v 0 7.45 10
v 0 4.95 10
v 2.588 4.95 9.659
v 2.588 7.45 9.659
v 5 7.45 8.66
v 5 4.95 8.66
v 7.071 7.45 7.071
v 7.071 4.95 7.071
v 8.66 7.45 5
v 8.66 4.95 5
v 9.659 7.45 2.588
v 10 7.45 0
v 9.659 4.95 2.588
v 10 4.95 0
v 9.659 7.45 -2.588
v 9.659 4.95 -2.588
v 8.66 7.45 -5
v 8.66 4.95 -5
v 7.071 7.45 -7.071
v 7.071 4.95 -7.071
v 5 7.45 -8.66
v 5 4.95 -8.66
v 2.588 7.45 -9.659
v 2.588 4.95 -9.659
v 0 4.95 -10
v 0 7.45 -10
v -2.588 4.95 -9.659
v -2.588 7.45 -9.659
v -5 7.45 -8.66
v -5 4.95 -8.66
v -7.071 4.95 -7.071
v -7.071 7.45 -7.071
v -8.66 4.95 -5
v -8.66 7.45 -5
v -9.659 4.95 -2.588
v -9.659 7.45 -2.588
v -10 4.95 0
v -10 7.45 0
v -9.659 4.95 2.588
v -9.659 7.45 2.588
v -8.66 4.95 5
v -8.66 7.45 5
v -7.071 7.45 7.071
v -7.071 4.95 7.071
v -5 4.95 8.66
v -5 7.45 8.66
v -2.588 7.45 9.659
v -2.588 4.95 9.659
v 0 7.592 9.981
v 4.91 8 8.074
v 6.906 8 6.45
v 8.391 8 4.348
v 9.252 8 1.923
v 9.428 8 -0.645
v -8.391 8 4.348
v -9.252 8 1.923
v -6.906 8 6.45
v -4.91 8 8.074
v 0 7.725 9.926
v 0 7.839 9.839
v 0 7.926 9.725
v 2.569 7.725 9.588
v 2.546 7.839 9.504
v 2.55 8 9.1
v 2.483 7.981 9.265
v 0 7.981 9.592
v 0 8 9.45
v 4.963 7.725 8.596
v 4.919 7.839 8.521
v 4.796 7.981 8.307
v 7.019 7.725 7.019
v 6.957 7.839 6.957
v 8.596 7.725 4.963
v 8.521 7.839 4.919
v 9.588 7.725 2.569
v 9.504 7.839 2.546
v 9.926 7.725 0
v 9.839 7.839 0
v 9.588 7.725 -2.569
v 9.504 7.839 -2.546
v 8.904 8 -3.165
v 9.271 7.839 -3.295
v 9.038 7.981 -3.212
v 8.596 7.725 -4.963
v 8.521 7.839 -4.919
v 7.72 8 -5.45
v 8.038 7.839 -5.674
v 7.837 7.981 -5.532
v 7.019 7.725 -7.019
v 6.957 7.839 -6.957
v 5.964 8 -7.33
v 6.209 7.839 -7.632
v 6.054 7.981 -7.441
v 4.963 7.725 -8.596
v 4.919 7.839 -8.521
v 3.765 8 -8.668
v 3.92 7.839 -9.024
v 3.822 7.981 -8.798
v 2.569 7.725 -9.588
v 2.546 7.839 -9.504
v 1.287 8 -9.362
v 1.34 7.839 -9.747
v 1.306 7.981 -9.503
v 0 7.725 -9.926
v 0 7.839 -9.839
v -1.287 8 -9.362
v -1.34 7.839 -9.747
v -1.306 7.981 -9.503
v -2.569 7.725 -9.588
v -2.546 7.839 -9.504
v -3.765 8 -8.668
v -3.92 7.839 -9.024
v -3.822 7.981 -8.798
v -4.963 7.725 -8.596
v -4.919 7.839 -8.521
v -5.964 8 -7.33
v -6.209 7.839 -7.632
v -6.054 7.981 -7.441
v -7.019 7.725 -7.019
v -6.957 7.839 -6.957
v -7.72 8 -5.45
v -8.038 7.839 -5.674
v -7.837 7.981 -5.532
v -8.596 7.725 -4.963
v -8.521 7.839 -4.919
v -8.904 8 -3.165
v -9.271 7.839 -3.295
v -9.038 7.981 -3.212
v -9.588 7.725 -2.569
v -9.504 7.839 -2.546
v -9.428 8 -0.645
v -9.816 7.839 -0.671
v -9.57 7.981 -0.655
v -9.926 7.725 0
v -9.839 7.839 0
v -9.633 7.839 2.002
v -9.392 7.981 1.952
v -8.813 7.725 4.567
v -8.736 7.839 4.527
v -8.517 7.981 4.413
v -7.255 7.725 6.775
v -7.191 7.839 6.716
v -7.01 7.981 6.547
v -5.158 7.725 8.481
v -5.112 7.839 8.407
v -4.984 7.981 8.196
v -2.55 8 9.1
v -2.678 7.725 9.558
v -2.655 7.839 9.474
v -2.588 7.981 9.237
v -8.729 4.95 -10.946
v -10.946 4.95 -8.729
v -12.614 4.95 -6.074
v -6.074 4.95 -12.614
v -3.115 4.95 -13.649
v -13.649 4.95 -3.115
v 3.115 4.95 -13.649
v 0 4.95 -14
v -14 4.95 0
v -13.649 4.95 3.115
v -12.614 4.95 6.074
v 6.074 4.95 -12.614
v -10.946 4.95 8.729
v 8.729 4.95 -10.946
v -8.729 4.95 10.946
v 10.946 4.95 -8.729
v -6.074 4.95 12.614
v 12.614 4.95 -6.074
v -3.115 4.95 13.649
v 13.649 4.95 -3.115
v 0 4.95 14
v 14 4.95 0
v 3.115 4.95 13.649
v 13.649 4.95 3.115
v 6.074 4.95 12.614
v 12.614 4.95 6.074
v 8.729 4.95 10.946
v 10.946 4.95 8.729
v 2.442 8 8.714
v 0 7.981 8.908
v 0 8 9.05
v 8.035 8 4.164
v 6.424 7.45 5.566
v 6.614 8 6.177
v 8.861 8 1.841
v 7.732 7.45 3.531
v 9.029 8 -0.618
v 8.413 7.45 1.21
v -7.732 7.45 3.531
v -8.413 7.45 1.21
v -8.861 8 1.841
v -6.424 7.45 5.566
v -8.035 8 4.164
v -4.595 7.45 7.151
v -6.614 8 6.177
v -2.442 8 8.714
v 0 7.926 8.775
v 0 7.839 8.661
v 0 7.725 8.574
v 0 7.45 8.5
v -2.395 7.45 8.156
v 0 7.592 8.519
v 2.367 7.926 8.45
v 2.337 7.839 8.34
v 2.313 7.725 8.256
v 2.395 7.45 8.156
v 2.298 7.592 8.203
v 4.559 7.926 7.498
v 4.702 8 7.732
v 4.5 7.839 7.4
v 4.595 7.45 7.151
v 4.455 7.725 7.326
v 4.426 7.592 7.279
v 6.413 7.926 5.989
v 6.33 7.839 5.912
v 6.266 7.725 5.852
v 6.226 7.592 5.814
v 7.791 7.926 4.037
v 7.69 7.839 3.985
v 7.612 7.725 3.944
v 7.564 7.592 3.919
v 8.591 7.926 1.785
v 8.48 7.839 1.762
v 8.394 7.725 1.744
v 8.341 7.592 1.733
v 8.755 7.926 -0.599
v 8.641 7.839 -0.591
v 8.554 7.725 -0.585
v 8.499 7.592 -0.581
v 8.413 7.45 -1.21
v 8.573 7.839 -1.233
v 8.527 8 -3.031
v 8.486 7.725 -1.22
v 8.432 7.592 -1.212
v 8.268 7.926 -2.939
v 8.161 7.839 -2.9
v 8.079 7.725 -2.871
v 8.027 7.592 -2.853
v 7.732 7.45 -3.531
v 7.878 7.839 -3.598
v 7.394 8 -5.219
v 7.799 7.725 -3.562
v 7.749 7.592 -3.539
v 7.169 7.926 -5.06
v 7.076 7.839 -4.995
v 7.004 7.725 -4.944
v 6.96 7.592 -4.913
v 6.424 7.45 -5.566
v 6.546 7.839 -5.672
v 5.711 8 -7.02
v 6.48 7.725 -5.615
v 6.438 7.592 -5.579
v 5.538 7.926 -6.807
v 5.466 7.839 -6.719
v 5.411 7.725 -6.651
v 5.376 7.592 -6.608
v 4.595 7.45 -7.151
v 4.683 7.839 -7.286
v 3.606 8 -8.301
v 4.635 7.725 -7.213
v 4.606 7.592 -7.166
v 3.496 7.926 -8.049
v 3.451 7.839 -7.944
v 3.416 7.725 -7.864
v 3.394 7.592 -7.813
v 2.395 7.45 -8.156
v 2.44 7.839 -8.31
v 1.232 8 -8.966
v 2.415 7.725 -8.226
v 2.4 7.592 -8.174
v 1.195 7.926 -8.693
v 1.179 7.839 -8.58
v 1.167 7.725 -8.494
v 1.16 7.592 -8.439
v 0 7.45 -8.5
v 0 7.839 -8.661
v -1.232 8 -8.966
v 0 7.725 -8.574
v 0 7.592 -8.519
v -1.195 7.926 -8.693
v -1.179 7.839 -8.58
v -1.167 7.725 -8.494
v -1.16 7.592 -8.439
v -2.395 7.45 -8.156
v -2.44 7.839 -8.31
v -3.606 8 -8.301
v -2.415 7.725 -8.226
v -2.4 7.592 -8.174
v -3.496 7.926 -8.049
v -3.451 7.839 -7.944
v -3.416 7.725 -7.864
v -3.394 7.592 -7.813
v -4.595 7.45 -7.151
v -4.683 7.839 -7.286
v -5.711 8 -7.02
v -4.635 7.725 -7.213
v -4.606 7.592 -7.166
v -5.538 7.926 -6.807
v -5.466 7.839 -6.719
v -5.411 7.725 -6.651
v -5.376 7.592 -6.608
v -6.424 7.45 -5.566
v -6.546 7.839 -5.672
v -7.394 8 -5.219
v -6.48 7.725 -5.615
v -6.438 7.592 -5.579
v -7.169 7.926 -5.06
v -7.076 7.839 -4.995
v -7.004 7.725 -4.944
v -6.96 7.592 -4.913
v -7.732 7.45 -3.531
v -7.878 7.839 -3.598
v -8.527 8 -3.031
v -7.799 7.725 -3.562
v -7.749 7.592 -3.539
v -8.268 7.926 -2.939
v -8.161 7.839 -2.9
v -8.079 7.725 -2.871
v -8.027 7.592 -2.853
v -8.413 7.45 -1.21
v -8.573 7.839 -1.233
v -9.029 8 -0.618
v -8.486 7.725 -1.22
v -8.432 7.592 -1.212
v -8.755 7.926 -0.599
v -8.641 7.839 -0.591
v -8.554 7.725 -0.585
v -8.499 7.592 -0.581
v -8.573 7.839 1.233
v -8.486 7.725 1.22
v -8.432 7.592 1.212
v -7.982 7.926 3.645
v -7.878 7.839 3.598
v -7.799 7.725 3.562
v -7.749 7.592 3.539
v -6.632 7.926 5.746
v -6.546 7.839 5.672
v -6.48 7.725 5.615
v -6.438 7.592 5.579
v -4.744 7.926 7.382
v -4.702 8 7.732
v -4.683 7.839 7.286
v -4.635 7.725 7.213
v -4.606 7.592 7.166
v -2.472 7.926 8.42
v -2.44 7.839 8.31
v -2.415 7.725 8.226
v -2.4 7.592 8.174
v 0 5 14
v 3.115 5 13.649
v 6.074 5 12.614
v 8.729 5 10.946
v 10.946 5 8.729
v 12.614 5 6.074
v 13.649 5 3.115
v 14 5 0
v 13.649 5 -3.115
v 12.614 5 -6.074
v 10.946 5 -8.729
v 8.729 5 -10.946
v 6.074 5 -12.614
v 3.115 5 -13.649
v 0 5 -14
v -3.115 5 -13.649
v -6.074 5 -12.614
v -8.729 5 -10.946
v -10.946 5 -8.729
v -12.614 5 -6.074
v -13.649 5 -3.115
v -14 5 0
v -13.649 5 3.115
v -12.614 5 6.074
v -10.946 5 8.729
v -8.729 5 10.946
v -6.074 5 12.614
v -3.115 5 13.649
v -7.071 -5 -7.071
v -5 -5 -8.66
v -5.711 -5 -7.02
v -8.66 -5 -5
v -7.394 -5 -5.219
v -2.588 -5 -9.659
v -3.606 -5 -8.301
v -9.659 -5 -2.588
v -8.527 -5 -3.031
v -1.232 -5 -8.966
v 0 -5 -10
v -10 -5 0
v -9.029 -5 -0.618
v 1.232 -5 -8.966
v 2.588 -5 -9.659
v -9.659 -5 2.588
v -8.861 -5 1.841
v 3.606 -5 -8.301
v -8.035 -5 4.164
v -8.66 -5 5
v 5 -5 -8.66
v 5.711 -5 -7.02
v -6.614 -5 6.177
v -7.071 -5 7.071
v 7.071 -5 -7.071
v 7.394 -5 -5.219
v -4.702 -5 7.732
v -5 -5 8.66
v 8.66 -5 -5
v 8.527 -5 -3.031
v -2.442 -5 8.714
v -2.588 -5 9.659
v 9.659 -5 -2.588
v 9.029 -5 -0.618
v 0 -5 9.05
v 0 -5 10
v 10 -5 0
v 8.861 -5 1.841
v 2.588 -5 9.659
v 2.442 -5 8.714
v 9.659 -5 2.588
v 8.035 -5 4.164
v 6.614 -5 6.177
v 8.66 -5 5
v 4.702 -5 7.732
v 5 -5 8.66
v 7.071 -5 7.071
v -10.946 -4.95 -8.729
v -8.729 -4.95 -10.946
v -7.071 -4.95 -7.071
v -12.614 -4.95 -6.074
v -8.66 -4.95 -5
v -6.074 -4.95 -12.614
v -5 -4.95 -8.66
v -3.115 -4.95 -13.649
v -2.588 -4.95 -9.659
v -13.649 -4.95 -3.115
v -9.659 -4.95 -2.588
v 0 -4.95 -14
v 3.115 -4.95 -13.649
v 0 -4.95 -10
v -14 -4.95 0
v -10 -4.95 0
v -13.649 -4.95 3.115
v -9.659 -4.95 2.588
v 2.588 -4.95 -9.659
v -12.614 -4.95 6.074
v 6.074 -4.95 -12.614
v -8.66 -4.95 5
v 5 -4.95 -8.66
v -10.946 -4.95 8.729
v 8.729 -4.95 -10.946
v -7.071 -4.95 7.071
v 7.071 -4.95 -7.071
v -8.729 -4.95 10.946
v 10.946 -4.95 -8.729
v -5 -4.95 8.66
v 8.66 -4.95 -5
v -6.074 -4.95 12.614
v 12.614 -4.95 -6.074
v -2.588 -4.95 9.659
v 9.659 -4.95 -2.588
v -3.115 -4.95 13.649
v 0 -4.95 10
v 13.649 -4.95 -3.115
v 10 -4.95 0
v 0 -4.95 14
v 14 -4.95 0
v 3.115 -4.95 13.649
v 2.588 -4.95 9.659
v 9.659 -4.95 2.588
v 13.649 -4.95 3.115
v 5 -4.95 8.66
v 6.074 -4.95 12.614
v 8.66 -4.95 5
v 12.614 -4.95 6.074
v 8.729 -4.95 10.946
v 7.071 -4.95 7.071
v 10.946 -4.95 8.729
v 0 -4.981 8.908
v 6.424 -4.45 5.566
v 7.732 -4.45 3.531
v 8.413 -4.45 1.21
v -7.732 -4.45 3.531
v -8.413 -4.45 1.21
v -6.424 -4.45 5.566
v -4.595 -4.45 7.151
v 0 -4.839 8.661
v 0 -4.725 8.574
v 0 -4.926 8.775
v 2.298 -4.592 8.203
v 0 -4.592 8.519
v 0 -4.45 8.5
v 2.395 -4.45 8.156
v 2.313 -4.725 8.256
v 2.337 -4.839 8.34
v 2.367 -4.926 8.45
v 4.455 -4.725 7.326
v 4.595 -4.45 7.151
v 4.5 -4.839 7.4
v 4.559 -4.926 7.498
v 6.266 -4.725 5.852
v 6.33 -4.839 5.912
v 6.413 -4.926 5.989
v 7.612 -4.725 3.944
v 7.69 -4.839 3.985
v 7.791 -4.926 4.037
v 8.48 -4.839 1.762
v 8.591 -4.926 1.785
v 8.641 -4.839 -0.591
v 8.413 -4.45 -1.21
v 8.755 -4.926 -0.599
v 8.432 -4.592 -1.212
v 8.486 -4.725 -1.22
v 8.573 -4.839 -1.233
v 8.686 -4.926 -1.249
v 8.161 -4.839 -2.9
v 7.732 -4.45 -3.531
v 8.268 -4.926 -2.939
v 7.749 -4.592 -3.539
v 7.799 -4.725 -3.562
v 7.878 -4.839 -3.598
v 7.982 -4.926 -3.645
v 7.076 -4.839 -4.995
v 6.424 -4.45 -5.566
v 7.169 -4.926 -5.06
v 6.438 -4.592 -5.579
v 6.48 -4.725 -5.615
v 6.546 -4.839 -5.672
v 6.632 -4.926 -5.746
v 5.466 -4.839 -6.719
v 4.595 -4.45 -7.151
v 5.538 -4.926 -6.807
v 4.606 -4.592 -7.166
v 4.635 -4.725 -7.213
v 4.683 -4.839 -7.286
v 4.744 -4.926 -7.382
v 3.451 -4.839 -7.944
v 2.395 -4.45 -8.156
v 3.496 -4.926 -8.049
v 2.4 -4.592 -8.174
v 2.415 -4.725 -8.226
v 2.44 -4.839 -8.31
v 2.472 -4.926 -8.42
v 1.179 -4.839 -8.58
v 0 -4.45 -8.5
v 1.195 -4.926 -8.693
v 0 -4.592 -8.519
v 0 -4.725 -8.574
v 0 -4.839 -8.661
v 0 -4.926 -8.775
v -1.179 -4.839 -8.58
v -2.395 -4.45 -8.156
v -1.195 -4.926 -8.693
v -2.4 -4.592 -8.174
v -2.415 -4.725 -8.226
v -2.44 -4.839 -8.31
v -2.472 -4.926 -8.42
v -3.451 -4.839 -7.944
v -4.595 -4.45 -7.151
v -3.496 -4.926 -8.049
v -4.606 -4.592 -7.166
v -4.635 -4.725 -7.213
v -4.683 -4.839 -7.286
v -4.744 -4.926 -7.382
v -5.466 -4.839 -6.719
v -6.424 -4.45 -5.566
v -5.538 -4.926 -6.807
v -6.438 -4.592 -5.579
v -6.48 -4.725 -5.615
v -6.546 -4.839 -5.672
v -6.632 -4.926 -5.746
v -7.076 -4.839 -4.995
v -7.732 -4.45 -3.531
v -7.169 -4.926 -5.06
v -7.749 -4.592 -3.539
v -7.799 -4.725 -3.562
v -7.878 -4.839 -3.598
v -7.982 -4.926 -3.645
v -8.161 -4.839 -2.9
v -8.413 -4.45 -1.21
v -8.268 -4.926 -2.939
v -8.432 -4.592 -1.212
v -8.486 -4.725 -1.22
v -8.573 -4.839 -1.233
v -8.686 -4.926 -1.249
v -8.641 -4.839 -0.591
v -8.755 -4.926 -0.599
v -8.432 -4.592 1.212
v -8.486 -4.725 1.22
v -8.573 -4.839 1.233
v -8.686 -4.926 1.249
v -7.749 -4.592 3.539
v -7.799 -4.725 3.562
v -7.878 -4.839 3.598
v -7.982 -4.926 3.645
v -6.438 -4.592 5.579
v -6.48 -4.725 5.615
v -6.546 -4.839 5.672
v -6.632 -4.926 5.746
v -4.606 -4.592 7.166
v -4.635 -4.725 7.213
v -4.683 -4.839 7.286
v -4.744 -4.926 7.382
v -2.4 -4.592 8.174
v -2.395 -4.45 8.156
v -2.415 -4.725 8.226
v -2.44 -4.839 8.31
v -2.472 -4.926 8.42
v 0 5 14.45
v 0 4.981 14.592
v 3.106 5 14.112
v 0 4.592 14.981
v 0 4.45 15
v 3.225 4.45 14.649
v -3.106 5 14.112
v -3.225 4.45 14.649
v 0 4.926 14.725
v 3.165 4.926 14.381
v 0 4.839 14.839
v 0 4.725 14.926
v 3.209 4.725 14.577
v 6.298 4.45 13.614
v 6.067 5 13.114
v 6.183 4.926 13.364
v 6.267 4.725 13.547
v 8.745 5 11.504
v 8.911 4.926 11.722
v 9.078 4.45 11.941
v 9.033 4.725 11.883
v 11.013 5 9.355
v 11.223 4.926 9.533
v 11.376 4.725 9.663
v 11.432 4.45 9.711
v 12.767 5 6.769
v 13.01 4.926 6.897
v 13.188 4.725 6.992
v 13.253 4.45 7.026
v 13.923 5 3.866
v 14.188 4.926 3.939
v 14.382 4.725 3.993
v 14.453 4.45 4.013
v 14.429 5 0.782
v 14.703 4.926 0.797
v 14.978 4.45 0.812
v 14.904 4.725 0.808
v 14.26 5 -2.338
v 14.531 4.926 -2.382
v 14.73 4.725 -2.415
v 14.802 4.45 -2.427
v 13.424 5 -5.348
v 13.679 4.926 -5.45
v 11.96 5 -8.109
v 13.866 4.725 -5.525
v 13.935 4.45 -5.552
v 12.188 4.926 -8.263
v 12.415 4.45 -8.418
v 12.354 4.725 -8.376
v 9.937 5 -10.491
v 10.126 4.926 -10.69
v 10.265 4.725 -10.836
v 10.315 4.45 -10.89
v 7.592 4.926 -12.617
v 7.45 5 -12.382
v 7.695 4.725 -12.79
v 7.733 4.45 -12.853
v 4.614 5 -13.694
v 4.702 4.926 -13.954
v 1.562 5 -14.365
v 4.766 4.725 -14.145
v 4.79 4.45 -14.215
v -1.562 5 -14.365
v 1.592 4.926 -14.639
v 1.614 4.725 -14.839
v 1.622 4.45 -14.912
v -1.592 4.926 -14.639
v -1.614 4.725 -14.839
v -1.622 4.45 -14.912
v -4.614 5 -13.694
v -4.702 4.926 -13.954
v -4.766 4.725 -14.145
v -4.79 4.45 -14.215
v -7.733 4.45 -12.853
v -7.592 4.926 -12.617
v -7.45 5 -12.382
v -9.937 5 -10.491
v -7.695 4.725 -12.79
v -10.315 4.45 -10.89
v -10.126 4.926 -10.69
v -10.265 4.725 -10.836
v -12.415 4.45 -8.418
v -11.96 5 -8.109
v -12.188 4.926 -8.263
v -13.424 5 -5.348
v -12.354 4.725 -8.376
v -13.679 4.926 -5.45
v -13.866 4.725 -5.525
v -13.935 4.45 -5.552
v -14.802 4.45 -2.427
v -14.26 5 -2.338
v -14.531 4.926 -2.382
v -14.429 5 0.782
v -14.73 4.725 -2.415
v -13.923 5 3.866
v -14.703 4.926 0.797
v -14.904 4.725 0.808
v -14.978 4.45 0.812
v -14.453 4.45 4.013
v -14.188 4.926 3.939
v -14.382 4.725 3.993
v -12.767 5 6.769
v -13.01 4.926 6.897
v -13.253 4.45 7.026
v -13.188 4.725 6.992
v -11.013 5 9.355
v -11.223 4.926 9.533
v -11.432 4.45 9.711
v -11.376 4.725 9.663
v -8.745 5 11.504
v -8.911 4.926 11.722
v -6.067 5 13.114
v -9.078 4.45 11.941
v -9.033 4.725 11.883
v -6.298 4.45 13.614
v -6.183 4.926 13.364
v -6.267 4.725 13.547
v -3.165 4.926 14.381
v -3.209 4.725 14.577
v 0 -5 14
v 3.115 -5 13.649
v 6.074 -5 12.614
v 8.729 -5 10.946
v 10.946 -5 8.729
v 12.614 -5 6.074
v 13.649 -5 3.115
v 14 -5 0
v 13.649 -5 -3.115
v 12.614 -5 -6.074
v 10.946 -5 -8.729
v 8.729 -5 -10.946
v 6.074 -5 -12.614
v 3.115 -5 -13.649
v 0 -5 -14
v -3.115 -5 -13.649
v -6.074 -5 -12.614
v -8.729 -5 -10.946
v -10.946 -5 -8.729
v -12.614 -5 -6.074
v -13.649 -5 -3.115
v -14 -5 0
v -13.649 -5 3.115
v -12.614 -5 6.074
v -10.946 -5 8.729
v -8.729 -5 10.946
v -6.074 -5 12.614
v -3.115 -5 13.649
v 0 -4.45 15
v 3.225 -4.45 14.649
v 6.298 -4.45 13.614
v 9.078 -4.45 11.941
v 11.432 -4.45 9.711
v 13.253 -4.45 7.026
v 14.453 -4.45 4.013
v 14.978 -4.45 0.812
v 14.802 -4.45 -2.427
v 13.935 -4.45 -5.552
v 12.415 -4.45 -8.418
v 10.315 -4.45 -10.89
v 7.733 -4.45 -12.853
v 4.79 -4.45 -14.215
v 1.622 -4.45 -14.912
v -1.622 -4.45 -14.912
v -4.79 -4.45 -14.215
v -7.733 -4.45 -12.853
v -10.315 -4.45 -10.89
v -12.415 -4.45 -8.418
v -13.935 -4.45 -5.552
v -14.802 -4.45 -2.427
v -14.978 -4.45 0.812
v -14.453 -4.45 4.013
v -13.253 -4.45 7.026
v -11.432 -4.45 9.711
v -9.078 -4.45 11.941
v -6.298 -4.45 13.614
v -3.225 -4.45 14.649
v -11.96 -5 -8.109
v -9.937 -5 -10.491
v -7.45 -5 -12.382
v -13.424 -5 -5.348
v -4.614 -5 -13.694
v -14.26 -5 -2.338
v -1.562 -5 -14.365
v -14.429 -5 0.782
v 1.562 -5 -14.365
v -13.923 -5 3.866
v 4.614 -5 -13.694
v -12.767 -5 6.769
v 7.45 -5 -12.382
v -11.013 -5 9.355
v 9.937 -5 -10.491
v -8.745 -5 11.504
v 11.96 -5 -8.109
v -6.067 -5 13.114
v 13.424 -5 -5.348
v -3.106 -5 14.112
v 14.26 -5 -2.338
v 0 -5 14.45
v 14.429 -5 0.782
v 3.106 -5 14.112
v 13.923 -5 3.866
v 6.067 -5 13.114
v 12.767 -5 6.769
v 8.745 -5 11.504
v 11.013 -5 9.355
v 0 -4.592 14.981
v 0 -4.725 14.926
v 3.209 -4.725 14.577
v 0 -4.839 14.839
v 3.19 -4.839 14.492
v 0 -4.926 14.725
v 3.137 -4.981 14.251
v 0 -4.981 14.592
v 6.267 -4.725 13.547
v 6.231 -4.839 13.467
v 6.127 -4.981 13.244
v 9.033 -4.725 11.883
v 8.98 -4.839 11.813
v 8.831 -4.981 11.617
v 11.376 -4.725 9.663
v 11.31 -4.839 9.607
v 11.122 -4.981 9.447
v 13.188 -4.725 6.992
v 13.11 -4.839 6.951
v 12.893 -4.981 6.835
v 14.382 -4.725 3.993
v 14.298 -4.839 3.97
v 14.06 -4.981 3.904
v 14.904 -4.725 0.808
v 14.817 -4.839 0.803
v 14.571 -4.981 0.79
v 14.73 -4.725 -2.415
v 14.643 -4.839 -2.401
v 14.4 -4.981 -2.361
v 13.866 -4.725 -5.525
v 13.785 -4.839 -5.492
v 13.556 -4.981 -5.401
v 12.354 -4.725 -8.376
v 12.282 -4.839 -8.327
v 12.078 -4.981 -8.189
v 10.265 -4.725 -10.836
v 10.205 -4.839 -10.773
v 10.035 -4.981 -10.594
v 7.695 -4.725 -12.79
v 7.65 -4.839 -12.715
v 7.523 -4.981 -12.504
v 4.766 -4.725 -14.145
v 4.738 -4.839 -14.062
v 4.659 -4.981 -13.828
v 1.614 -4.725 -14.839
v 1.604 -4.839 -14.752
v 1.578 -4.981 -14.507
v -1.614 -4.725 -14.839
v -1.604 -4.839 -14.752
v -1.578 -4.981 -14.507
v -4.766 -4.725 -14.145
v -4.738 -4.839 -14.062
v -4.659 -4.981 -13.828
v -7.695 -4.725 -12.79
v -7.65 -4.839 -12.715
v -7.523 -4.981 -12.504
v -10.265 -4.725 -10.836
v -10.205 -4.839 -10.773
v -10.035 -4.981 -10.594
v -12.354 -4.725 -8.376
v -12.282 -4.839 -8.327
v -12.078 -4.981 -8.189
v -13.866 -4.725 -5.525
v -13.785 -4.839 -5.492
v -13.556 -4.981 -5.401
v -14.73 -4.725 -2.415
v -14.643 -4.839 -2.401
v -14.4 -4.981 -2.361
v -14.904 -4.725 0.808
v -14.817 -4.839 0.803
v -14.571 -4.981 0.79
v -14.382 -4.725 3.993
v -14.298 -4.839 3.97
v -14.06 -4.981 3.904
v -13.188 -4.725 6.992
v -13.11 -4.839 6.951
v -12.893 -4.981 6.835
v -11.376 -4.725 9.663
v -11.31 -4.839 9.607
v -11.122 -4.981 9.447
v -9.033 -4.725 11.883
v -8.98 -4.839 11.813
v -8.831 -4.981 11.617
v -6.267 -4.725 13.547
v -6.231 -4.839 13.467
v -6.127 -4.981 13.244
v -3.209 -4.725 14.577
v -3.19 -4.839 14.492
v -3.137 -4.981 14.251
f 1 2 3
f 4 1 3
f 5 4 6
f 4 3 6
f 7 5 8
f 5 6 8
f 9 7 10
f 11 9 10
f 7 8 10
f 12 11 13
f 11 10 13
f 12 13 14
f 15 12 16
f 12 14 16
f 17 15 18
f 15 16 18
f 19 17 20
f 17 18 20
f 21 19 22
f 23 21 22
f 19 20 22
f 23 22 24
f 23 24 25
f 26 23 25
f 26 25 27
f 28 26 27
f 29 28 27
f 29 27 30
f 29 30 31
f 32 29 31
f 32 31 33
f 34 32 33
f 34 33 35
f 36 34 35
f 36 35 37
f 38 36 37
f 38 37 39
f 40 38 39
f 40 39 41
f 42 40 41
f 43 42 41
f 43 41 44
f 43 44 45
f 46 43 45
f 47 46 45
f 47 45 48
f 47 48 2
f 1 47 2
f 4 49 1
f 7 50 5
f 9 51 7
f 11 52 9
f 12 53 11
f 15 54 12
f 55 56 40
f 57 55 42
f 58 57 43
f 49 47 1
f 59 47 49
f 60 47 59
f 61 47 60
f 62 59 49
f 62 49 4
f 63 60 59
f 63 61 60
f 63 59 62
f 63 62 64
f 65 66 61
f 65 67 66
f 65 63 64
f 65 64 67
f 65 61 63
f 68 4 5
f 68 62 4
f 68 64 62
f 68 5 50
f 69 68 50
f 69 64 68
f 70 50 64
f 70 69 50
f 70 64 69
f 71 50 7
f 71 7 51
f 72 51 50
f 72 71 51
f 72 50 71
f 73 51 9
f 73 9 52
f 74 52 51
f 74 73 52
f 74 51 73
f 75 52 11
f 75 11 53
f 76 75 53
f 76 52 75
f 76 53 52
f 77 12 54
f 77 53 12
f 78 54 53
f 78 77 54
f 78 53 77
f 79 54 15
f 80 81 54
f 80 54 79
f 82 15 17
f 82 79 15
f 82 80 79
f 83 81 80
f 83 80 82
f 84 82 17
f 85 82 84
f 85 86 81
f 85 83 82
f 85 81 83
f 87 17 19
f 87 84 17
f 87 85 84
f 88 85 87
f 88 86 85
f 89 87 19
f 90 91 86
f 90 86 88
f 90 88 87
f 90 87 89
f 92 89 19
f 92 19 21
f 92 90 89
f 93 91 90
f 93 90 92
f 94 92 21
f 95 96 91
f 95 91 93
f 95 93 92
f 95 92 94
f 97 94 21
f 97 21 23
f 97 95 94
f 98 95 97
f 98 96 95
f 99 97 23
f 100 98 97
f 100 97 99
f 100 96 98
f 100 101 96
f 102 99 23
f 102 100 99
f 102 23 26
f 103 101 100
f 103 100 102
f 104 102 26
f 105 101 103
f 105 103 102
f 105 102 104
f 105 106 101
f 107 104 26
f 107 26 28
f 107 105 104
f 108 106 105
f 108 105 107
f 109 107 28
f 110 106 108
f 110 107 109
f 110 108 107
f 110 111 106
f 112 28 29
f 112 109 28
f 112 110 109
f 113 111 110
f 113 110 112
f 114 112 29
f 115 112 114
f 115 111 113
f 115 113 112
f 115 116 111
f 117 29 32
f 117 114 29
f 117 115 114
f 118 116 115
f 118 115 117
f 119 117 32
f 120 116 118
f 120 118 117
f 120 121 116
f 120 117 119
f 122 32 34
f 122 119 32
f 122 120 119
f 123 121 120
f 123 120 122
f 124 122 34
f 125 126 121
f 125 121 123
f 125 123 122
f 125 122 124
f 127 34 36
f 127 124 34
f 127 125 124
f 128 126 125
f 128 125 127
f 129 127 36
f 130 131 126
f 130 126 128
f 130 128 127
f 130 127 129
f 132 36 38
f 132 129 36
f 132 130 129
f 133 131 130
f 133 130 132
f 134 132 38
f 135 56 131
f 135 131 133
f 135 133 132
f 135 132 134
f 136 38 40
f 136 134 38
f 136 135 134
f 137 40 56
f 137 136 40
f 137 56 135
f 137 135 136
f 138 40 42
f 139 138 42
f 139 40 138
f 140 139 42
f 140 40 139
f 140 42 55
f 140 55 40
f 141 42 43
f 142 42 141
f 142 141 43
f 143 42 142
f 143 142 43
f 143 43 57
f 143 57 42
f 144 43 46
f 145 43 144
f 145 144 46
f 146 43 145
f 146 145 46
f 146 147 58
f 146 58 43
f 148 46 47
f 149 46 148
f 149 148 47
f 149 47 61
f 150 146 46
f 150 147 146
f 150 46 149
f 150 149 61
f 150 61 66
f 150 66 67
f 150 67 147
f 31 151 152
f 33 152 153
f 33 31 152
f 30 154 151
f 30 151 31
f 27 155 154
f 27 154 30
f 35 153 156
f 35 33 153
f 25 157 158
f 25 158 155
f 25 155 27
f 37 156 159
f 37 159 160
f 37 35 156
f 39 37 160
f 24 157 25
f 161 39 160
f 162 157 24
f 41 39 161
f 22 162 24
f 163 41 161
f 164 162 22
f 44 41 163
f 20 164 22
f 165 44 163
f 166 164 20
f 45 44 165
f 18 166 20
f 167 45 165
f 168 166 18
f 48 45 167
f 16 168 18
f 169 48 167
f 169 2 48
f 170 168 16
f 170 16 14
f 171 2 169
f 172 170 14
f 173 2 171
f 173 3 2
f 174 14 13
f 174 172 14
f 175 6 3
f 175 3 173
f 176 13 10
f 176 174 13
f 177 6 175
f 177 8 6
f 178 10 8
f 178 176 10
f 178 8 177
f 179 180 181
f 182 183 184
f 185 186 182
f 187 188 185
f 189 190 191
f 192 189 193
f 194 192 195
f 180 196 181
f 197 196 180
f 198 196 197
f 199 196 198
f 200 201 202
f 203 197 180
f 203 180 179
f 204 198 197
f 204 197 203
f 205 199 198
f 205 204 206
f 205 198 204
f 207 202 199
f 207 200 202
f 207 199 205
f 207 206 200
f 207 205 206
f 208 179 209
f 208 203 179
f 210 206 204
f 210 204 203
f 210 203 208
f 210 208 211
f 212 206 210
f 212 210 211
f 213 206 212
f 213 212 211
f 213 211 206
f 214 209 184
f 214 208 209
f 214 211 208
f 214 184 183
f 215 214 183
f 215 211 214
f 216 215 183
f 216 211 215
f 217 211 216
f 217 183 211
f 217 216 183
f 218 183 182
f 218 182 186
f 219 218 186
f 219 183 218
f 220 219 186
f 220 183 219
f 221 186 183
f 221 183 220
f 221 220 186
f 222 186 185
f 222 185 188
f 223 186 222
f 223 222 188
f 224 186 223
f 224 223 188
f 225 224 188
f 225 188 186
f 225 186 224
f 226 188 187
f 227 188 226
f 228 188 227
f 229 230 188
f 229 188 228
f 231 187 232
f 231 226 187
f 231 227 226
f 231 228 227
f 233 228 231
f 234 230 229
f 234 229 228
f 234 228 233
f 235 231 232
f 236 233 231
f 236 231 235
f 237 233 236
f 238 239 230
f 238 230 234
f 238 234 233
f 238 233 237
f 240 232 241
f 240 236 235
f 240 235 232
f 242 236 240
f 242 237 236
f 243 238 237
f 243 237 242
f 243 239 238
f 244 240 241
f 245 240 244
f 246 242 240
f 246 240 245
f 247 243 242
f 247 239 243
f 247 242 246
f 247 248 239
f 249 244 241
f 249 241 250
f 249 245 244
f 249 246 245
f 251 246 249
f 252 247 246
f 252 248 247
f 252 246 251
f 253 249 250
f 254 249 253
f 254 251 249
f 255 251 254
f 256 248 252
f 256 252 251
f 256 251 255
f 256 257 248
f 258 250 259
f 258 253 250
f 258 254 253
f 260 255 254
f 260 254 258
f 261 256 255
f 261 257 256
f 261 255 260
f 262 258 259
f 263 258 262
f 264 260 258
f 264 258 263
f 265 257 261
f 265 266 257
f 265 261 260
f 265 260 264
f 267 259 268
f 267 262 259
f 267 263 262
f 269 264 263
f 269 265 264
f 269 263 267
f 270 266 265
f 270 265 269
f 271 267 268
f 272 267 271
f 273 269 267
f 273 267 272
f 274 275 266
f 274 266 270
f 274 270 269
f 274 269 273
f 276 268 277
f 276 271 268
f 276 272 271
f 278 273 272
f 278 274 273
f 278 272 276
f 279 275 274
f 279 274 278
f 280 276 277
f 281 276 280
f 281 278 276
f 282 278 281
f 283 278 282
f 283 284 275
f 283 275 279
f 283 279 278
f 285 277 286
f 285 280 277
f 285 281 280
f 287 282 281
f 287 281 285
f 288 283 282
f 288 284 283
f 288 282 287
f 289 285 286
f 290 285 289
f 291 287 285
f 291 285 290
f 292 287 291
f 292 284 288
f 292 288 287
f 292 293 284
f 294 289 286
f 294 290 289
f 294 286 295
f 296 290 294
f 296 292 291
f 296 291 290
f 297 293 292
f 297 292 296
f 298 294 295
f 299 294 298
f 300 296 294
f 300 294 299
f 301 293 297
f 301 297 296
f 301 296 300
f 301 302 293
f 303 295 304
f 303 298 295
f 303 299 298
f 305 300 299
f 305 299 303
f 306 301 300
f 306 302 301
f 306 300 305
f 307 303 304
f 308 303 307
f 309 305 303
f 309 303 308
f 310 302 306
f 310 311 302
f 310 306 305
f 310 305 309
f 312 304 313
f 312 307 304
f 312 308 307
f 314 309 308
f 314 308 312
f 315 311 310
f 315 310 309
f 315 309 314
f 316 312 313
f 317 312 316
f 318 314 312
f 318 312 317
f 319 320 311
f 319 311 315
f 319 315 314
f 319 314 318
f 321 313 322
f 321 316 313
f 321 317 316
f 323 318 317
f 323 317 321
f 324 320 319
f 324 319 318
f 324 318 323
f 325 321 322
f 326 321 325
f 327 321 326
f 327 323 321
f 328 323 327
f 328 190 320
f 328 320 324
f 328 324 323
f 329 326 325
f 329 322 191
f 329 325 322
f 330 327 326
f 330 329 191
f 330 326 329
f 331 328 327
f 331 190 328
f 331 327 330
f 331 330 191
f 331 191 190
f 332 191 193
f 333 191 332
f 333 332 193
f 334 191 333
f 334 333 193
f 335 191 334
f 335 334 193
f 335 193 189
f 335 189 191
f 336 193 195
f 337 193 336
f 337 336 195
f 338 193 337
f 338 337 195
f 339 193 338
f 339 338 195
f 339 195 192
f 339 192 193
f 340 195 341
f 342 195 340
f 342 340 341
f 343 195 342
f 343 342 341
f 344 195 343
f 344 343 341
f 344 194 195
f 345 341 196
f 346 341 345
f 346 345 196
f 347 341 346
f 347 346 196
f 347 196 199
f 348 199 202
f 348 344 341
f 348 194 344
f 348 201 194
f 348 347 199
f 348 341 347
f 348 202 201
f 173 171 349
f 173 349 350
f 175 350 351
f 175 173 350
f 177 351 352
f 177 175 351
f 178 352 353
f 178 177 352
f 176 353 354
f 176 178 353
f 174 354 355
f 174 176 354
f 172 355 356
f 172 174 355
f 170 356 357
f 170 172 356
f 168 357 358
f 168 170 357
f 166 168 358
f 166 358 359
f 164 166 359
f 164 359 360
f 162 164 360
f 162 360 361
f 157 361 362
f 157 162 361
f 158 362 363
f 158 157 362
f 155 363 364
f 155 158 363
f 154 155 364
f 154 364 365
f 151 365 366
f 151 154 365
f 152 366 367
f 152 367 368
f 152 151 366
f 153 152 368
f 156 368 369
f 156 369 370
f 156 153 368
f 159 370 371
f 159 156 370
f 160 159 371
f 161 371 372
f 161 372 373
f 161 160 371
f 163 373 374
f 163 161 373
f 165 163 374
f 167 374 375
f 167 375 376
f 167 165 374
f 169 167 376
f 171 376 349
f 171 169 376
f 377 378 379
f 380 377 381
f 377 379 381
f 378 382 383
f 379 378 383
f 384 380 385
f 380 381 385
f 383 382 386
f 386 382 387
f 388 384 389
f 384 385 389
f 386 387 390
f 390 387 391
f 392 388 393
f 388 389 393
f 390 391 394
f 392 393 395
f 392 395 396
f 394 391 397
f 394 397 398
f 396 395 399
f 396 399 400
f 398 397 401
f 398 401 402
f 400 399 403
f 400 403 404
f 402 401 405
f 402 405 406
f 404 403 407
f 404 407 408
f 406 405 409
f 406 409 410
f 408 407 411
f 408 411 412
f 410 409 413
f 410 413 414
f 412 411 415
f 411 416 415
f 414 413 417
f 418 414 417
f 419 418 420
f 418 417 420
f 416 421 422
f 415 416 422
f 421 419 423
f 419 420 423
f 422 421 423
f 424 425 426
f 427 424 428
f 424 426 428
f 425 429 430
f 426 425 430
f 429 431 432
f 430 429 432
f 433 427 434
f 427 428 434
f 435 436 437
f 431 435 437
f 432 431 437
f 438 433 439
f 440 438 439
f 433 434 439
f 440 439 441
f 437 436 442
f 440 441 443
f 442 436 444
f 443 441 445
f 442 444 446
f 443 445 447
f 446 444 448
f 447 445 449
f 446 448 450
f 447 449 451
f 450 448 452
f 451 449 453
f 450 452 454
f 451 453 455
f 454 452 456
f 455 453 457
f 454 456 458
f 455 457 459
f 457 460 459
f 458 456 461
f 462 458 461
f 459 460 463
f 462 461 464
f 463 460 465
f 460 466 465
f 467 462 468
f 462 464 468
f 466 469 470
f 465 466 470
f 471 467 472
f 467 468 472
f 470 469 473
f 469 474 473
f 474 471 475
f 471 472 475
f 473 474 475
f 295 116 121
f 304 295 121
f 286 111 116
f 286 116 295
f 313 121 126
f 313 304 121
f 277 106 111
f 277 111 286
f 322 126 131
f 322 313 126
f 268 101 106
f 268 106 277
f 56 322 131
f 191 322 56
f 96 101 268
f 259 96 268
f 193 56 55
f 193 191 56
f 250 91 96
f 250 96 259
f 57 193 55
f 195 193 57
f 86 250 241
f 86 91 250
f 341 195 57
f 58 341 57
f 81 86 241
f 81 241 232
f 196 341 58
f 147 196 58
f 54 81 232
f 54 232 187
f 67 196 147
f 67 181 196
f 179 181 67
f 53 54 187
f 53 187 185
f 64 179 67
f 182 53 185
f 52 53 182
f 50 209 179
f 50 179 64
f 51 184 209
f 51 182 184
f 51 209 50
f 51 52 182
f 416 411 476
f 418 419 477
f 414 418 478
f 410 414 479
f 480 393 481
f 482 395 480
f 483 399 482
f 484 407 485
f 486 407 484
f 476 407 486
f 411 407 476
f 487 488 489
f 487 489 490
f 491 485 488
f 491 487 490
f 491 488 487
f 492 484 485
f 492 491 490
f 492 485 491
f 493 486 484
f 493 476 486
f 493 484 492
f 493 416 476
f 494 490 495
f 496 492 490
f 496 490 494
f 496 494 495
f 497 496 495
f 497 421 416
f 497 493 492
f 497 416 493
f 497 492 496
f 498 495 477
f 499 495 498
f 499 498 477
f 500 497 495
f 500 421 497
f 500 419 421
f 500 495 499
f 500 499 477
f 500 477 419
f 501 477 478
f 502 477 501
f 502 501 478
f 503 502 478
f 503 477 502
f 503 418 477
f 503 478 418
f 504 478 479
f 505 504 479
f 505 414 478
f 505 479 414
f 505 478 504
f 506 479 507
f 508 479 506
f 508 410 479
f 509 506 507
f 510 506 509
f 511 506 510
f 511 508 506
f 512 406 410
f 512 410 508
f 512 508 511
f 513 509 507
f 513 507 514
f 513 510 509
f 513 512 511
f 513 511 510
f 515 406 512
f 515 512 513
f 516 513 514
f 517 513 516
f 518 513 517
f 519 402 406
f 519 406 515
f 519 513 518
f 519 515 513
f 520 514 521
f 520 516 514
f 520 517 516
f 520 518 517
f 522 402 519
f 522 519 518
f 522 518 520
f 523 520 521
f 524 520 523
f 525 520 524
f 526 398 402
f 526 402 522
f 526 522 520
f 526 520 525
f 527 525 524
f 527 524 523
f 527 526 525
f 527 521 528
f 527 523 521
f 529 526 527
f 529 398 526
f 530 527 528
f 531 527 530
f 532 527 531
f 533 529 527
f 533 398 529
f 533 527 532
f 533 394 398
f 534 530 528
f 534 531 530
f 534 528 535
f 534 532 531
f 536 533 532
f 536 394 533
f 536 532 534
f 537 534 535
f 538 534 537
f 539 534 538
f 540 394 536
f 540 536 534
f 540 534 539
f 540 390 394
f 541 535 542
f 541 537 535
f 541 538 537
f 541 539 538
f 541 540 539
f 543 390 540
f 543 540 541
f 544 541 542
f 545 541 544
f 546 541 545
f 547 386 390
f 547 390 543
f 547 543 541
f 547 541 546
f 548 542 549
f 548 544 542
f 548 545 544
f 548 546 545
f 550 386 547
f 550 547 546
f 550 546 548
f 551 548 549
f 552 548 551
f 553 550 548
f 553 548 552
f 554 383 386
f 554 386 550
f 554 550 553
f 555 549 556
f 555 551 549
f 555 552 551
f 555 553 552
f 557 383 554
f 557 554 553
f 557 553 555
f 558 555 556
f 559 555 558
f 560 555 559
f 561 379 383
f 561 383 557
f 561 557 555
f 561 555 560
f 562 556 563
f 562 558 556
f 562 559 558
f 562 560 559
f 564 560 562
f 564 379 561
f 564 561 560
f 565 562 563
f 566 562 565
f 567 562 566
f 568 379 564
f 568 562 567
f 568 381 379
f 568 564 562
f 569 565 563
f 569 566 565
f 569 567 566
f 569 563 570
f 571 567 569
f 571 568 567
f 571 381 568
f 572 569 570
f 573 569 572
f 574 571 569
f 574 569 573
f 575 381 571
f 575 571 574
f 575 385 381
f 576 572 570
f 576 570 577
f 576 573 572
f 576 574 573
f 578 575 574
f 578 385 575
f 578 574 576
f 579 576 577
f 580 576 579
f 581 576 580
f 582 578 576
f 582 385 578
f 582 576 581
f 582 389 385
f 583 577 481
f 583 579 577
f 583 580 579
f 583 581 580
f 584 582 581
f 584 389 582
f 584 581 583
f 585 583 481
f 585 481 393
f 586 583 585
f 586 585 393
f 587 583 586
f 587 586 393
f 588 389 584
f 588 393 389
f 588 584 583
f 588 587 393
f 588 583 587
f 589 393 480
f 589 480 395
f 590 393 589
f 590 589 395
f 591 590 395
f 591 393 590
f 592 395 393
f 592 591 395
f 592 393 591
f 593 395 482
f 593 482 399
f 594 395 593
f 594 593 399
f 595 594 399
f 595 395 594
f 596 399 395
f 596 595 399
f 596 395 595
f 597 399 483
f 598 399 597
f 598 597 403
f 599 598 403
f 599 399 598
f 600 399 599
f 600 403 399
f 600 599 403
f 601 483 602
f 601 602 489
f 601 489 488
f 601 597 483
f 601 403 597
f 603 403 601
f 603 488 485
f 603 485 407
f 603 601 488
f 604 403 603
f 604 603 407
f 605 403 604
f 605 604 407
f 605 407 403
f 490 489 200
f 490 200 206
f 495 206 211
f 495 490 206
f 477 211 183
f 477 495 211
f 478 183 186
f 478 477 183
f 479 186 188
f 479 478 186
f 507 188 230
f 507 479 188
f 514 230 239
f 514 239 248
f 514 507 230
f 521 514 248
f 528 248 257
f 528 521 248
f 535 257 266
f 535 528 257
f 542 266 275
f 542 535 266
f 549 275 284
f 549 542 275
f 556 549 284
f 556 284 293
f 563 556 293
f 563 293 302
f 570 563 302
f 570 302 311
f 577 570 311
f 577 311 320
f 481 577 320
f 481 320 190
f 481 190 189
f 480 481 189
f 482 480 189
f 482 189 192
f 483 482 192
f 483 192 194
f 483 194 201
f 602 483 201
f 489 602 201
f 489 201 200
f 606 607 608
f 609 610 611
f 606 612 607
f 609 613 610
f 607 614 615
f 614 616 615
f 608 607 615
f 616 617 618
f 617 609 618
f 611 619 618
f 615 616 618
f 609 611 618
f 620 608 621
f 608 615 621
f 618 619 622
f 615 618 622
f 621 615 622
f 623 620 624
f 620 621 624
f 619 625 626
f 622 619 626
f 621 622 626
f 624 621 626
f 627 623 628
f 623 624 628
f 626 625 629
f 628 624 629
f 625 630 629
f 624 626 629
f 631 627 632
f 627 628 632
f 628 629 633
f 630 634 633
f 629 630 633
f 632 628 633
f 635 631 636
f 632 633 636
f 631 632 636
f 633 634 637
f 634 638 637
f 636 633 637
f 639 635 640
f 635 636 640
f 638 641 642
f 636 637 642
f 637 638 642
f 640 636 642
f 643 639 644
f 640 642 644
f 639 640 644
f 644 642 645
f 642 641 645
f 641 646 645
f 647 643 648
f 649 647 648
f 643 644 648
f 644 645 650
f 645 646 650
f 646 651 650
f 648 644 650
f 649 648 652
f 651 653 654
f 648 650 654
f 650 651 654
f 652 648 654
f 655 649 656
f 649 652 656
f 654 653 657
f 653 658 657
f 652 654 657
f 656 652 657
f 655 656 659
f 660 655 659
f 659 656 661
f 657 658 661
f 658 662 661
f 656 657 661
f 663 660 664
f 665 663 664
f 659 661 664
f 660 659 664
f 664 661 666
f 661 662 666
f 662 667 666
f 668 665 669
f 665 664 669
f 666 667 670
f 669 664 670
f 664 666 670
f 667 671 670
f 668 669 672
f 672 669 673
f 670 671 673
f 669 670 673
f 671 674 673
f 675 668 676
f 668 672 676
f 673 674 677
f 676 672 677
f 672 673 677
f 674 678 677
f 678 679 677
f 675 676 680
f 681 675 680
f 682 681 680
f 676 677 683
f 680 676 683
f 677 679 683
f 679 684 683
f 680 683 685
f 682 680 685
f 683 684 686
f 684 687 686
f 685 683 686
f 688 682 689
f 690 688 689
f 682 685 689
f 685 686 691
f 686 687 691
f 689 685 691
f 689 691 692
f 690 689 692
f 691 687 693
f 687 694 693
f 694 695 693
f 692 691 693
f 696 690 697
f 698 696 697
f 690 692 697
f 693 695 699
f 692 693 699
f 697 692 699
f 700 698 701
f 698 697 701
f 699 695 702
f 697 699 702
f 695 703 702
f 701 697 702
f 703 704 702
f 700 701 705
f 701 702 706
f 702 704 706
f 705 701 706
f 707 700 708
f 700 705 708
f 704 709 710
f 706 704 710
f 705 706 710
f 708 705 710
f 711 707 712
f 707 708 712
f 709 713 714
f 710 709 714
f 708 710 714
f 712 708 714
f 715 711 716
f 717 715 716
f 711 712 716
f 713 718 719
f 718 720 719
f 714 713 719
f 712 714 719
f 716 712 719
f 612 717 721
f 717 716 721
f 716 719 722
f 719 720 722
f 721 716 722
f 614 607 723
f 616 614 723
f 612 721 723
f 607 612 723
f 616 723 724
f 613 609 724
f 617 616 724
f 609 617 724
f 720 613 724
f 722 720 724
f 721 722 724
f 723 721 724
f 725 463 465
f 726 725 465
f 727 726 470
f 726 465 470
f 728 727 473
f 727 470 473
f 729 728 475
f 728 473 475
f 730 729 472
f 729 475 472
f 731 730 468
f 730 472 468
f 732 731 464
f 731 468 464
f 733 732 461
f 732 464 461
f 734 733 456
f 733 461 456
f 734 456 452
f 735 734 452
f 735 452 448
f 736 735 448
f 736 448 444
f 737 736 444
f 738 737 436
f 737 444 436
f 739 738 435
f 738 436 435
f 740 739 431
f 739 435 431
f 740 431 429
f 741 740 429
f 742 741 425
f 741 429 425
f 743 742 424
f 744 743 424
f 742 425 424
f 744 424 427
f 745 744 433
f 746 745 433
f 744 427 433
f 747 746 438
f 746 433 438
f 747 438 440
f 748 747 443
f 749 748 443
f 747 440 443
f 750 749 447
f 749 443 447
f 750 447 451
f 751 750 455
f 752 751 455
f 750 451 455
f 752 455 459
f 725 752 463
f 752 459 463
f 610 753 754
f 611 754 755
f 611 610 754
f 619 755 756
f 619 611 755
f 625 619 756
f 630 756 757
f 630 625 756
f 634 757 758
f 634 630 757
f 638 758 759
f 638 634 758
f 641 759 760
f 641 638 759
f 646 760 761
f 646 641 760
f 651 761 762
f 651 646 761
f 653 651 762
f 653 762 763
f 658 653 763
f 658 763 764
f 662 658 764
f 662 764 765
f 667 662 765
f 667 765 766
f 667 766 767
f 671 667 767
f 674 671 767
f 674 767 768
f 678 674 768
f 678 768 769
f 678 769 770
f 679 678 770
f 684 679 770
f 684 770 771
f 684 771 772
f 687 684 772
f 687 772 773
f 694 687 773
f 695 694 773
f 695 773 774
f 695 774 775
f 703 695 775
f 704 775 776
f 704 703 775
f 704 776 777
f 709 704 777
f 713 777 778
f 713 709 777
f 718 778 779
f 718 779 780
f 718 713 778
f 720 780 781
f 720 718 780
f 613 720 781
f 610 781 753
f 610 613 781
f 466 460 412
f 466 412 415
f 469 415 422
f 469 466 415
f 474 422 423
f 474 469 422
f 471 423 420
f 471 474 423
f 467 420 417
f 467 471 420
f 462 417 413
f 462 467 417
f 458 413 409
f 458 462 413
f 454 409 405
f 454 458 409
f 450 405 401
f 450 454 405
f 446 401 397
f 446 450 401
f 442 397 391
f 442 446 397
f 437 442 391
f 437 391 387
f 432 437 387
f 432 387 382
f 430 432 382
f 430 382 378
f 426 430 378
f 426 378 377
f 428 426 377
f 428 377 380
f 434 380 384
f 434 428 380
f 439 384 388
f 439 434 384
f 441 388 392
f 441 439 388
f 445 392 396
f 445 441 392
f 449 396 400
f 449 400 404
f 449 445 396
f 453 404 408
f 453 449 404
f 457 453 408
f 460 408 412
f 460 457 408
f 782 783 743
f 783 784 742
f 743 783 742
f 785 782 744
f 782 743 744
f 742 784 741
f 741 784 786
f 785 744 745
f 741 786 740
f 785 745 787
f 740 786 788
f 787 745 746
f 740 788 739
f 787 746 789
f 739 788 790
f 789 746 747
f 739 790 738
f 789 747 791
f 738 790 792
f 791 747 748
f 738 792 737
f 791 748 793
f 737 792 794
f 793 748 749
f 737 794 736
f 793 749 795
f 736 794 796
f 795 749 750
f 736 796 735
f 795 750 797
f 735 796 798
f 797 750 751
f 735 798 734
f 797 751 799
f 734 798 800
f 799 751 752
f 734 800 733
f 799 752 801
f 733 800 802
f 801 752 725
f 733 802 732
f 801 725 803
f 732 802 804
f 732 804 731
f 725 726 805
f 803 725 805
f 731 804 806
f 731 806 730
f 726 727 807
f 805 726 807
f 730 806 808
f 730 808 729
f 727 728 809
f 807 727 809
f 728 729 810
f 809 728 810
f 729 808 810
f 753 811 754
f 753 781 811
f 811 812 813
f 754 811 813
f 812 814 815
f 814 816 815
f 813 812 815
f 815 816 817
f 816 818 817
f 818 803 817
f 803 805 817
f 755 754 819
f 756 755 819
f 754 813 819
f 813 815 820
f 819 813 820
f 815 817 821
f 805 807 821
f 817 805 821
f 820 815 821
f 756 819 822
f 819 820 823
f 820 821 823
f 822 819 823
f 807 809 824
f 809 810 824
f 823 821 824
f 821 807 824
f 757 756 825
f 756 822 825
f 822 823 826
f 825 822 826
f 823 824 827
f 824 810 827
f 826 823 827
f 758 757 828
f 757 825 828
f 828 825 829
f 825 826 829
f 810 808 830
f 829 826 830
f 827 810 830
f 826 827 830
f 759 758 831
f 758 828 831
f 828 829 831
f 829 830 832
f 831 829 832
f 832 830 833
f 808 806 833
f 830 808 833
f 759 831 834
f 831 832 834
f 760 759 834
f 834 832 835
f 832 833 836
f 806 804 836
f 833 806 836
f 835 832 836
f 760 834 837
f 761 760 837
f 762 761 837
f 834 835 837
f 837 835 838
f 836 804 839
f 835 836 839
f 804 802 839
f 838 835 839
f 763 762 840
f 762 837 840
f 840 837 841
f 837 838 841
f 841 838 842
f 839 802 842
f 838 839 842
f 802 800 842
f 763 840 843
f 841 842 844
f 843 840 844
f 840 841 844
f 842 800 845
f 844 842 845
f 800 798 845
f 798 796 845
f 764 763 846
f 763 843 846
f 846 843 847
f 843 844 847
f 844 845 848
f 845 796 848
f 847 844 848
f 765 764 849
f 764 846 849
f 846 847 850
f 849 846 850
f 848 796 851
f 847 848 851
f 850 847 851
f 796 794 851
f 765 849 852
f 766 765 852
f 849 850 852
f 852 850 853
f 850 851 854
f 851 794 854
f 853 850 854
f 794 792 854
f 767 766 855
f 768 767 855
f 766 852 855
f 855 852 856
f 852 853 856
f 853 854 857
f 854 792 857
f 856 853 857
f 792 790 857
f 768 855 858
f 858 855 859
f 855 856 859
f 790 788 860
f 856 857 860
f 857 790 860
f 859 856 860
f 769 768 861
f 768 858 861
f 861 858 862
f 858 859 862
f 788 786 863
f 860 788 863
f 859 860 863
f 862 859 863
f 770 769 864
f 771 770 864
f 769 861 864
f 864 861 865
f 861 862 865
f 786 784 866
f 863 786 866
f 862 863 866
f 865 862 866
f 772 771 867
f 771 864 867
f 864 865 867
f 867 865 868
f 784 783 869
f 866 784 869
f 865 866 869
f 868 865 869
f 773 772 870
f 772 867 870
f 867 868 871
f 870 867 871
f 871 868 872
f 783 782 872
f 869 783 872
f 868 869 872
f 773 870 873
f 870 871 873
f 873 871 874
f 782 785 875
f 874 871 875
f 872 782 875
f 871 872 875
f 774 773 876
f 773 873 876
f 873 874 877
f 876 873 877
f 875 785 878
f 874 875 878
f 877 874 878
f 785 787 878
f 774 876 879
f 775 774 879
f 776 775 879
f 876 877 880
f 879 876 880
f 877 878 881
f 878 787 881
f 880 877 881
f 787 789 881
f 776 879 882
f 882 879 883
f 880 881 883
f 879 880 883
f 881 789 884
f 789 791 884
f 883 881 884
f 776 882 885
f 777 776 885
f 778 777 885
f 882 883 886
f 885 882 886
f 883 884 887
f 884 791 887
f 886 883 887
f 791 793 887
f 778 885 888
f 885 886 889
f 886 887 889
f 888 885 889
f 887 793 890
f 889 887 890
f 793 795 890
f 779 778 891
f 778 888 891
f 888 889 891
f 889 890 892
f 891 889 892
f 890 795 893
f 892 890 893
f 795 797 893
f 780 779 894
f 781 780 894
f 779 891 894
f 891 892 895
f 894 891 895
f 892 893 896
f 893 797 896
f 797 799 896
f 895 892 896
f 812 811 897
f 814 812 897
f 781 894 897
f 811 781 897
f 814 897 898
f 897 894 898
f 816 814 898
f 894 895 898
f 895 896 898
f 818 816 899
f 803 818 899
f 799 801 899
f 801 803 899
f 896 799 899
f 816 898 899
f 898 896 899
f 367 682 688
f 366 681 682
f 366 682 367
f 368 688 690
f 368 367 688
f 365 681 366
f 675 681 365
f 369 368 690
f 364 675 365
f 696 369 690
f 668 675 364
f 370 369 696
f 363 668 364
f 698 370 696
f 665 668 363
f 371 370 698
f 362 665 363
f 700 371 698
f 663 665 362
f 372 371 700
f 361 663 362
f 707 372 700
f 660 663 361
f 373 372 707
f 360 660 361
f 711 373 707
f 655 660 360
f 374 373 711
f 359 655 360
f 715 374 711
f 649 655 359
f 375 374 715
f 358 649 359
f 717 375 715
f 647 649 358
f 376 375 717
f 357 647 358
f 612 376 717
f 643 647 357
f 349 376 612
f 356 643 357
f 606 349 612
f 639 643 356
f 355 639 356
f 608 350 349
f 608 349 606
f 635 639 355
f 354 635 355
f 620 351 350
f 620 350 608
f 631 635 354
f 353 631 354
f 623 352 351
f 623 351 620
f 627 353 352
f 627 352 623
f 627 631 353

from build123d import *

# Parameters (mm, degrees)
SKETCH1_R           = 15
SKETCH1_R_2         = 8.5
BOSS_EXTRUDE1_DEPTH = 5
SKETCH2_R           = 10
SKETCH2_R_2         = 8.5
BOSS_EXTRUDE2_DEPTH = 3
CUT_EXTRUDE1_START  = -0.05
SKETCH3_R           = 14
SKETCH3_R_2         = 10
CUT_EXTRUDE1_DEPTH  = 0.05
FILLET1_R           = 0.55


with BuildPart() as part:
    # Sketch1 → Boss-Extrude1 (new, symmetric)
    with BuildSketch(Plane(origin=(0, 0, 0), x_dir=(1, 0, 0), z_dir=(0, 1, 0))):
        Circle(SKETCH1_R)
        Circle(SKETCH1_R_2, mode=Mode.SUBTRACT)
    extrude(amount=BOSS_EXTRUDE1_DEPTH, both=True)

    # Sketch2 → Boss-Extrude2 (add)
    with BuildSketch(Plane(origin=(0, 5, 0), x_dir=(1, 0, 0), z_dir=(0, 1, 0))):
        Circle(SKETCH2_R)
        Circle(SKETCH2_R_2, mode=Mode.SUBTRACT)
    extrude(amount=BOSS_EXTRUDE2_DEPTH)

    # Sketch3 → Cut-Extrude1 (cut)
    with BuildSketch(Plane(origin=(0, 5, 0), x_dir=(1, 0, 0), z_dir=(0, 1, 0)).offset(CUT_EXTRUDE1_START)):
        Circle(SKETCH3_R)
        Circle(SKETCH3_R_2, mode=Mode.SUBTRACT)
    cut_extrude1 = extrude(amount=CUT_EXTRUDE1_DEPTH, mode=Mode.SUBTRACT)

    # Mirror1: Cut-Extrude1 across plane
    add(cut_extrude1.mirror(Plane.ZX), mode=Mode.SUBTRACT)

    # Fillet1
    fillet1_edges = [part.edges().sort_by_distance(p)[0] for p in [
        (-8.5, 8, 0),
        (-8.5, -5, 0),
        (-15, -5, 0),
        (-15, 5, 0),
        (-10, 8, 0),
    ]]
    fillet(fillet1_edges, radius=FILLET1_R)


solid = part.part
